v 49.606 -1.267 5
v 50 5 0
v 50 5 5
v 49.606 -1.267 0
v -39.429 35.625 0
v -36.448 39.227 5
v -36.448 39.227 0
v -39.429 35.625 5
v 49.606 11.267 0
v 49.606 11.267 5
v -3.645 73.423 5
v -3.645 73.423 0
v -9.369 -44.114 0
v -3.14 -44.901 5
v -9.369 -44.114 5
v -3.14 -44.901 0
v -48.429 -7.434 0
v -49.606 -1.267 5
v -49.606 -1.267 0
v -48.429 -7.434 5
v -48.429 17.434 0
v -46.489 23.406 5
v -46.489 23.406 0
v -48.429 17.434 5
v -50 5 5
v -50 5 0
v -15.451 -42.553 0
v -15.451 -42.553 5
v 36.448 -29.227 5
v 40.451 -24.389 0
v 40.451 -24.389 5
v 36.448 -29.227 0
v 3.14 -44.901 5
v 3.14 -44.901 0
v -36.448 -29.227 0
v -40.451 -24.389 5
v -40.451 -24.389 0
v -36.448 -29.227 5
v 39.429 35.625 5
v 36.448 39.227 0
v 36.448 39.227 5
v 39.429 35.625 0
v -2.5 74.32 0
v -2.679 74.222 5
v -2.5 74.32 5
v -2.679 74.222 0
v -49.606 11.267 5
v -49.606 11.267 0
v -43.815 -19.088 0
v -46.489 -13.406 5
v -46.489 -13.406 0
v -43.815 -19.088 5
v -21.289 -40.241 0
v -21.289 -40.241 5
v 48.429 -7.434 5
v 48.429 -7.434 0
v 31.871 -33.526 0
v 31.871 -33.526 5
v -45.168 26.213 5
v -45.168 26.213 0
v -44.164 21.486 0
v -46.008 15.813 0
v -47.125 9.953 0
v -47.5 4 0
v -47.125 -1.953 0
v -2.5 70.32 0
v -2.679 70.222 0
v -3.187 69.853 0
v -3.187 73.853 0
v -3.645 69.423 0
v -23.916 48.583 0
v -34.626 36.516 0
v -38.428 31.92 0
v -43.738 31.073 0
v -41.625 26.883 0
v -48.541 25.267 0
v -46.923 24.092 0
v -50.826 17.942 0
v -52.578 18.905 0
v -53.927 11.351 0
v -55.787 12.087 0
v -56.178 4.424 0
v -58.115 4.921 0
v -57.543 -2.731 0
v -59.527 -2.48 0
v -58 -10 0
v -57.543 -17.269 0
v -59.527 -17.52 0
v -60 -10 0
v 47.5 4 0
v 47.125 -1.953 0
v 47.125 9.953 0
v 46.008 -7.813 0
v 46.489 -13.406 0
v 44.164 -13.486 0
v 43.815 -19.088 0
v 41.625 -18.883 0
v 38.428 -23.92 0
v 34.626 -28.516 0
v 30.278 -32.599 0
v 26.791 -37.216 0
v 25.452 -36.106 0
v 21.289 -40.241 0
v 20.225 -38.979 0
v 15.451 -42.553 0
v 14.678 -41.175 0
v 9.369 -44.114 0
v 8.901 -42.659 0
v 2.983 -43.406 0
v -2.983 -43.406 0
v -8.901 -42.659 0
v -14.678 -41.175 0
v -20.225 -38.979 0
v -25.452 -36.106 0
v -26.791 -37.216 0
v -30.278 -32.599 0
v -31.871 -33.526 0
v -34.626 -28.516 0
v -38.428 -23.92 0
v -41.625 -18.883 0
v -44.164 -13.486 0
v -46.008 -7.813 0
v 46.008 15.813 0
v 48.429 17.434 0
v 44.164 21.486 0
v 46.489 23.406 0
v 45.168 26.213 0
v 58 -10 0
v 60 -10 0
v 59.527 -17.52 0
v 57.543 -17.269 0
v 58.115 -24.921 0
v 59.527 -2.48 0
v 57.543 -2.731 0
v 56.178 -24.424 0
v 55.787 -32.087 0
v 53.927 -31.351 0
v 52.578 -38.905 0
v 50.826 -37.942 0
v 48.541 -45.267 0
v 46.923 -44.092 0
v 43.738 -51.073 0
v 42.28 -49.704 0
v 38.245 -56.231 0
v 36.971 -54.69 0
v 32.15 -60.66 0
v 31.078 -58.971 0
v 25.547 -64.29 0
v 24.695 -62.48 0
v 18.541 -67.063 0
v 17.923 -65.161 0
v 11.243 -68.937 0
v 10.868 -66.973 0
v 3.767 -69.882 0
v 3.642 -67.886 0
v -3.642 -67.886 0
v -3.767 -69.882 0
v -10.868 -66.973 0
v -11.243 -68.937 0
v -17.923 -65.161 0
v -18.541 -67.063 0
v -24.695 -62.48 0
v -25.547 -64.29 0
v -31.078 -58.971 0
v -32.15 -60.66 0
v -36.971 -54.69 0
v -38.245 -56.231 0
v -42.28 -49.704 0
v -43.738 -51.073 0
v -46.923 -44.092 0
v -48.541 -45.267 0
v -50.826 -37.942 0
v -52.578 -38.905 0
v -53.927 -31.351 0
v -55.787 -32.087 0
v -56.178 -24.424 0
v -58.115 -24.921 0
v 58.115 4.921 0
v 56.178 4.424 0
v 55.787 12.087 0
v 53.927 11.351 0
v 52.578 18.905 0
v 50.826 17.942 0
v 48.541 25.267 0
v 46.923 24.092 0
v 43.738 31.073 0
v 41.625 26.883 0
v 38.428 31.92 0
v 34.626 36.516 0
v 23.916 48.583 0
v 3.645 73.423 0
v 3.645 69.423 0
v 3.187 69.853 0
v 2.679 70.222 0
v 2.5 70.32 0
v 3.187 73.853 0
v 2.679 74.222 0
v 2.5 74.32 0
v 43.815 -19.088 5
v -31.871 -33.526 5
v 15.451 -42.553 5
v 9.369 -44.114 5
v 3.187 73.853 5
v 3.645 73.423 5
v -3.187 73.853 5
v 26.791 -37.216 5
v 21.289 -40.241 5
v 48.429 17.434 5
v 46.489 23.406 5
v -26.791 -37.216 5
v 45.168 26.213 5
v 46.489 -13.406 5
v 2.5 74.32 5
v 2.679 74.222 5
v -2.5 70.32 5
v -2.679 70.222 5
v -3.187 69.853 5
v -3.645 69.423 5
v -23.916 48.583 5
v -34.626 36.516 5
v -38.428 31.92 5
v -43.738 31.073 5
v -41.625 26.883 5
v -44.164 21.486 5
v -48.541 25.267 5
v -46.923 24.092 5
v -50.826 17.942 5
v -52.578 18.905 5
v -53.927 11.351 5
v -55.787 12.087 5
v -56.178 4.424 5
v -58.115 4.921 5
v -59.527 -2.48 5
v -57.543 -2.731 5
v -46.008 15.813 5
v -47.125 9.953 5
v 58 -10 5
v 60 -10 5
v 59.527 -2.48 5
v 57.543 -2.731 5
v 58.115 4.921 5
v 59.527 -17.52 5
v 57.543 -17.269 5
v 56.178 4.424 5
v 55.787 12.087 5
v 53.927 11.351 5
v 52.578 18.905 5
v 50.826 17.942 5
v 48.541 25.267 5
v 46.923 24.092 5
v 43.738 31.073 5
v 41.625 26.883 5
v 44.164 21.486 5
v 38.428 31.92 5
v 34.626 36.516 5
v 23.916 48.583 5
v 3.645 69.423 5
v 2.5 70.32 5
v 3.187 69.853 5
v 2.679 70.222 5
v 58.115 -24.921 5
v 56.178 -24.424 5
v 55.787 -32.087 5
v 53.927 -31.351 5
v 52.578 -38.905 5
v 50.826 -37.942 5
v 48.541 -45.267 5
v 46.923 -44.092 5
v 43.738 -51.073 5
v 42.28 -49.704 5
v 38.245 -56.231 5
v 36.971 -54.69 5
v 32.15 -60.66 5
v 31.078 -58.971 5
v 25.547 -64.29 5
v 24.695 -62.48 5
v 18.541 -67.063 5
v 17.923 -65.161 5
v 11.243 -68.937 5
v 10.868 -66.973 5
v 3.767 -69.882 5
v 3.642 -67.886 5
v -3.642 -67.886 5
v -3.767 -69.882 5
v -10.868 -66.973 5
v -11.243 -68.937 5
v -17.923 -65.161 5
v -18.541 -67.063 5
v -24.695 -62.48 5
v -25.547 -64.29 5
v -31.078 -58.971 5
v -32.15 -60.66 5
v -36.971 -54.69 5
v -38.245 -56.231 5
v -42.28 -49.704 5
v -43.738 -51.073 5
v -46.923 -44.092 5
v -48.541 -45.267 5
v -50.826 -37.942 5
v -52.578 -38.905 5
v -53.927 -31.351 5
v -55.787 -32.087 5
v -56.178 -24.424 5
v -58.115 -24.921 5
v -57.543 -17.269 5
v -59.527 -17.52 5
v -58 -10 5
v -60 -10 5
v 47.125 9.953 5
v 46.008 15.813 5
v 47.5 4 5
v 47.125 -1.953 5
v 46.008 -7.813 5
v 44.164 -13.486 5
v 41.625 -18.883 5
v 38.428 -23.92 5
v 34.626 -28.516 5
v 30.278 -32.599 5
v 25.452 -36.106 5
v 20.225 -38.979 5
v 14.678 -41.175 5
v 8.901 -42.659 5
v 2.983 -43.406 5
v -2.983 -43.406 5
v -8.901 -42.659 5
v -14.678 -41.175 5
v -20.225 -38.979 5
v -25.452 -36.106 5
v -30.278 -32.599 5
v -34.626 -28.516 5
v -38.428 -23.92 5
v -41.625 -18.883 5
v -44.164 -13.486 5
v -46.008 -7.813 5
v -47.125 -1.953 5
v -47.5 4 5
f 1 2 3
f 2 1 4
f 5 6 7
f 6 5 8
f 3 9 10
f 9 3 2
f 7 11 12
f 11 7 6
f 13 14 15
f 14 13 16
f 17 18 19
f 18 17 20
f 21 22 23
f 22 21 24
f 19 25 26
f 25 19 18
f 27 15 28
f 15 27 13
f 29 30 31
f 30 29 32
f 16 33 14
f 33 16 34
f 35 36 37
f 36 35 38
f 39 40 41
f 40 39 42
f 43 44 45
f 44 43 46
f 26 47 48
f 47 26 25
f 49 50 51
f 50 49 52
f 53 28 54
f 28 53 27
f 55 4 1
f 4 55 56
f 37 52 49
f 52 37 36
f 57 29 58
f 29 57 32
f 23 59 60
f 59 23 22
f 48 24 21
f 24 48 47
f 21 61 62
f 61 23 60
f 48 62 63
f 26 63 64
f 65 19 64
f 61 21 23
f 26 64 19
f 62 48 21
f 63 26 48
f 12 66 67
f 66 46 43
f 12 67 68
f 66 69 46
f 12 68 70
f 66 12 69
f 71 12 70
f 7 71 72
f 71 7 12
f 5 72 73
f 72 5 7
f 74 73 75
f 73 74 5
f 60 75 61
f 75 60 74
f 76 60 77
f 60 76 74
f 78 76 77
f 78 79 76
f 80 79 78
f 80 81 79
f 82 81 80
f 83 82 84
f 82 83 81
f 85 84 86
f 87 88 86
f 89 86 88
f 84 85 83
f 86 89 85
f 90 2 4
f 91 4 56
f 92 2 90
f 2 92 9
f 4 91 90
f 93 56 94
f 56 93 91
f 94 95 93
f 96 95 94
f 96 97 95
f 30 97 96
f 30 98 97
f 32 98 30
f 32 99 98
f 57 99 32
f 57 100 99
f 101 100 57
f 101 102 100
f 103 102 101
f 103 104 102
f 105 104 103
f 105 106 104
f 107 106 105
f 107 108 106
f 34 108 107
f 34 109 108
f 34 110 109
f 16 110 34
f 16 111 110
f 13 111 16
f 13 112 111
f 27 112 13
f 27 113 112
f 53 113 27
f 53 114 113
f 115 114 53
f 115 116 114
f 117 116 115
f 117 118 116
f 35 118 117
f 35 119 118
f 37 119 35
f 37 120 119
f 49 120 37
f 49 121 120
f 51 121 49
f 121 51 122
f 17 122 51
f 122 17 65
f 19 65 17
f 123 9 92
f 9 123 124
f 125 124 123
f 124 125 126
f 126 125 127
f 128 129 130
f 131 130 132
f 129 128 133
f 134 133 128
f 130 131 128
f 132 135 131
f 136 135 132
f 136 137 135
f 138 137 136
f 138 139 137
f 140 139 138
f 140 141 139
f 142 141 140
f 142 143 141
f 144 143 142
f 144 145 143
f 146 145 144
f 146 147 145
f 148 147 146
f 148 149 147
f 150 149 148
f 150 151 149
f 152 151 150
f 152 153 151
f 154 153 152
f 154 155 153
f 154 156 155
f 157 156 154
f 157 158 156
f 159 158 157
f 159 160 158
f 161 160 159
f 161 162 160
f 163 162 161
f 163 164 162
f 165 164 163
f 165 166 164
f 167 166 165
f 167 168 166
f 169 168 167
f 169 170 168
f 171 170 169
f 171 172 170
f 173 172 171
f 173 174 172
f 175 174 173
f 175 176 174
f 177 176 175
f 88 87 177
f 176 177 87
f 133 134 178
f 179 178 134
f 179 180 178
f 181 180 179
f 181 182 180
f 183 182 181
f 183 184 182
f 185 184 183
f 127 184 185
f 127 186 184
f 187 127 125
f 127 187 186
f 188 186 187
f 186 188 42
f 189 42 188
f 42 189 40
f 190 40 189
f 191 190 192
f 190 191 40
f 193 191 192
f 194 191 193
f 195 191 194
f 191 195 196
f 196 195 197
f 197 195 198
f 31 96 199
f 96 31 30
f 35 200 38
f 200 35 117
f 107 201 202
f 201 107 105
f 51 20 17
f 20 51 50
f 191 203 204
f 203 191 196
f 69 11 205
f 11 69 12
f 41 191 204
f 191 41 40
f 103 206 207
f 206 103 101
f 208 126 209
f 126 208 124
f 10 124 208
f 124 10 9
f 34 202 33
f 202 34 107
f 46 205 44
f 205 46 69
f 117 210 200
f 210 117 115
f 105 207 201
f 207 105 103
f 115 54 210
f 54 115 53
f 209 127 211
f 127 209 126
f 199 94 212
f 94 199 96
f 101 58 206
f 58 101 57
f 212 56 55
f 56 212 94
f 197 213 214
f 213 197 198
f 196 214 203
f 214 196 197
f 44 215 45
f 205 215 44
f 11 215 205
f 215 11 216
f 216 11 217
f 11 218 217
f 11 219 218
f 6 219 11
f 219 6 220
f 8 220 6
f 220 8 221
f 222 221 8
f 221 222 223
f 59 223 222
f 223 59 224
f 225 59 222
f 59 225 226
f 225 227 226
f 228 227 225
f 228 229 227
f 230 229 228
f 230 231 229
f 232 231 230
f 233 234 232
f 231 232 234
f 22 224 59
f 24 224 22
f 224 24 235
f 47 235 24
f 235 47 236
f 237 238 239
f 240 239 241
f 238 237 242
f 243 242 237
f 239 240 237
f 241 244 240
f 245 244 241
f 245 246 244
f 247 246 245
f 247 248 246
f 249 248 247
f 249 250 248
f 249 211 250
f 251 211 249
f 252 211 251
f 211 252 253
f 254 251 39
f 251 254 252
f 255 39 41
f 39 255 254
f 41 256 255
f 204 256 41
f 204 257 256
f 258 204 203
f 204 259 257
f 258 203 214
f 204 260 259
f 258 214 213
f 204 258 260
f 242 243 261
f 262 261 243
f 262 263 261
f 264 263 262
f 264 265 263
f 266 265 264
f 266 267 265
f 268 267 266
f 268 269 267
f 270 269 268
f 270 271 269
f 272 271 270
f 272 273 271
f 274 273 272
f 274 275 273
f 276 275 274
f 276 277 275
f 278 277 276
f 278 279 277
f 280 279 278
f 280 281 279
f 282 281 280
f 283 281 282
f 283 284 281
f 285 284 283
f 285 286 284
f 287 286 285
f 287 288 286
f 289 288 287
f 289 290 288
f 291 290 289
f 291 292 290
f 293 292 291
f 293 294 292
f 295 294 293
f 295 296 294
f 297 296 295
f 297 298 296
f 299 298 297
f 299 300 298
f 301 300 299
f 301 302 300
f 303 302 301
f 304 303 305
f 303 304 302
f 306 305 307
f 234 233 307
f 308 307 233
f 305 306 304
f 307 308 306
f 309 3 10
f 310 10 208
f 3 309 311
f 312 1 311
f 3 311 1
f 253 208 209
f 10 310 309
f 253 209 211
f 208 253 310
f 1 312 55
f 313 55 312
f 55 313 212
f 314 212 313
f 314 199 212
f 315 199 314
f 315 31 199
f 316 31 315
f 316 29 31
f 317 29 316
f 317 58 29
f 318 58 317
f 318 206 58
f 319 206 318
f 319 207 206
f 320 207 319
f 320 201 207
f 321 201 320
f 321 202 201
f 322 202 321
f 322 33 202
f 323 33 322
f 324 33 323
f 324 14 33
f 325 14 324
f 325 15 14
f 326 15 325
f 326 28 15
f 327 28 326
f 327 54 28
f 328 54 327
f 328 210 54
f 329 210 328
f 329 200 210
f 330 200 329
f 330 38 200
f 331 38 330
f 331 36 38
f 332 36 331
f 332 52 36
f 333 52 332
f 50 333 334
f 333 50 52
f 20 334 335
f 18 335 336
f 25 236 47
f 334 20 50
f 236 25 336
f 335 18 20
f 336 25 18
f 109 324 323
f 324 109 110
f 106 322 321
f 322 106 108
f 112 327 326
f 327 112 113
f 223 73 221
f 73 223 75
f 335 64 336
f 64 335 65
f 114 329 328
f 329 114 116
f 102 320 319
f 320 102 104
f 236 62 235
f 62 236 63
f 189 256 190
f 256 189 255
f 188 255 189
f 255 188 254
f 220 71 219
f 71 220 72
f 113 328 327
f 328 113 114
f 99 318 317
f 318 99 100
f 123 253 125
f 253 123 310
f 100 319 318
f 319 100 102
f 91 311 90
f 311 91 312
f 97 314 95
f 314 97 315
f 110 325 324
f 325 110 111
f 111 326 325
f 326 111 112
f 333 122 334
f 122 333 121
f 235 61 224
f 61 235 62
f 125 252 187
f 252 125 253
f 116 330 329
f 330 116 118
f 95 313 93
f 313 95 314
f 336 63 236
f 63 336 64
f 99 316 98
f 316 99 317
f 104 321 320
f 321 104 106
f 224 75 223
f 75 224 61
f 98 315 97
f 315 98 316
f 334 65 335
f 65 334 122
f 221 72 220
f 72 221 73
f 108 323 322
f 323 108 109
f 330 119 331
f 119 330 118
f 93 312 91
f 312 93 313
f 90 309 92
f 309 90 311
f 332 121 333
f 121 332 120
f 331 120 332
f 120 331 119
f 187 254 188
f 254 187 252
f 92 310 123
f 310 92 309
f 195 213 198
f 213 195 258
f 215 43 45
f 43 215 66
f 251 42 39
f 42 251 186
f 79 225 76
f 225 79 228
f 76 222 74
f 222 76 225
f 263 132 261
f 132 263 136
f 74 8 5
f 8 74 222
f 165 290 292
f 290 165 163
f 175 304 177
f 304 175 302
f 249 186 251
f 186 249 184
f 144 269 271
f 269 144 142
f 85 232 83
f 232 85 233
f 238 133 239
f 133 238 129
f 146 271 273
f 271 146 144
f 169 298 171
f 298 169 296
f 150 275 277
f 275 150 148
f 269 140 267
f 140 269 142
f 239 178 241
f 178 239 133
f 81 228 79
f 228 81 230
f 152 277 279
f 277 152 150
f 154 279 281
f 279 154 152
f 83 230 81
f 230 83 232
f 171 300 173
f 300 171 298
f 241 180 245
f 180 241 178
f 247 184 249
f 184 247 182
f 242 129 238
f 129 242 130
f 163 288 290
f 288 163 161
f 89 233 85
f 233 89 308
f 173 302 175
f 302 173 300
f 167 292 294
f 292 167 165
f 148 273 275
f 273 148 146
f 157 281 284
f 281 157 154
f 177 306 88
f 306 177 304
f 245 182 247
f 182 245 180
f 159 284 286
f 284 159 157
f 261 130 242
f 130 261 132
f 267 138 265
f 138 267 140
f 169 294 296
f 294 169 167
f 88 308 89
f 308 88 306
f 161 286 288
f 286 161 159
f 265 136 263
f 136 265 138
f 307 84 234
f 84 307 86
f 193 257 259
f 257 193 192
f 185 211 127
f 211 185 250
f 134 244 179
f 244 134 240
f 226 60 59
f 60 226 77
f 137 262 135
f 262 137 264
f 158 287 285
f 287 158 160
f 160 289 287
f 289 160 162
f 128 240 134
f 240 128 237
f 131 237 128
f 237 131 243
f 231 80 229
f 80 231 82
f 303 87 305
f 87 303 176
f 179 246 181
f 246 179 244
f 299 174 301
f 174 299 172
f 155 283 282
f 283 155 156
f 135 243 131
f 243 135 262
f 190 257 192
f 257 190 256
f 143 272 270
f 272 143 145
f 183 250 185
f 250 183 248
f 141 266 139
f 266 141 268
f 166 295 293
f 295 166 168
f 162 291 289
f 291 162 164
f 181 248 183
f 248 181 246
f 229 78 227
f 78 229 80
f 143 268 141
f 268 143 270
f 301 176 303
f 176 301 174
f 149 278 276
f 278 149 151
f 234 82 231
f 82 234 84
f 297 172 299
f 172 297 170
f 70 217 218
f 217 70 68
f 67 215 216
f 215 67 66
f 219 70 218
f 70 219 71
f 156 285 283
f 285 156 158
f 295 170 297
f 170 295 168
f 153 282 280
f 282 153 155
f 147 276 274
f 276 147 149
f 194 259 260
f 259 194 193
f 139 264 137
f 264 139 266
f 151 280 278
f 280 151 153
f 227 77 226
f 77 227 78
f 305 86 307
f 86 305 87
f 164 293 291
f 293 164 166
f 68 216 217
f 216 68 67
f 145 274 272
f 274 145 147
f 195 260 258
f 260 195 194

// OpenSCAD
$fn=50;

union() {
    difference() {
        hull() {
            translate([0,5,0]) cylinder(d=100,h=5);
            translate([0,70,0]) cylinder(d=10,h=5);
        }
        hull() {
            translate([0,4,-0.05]) cylinder(d=95,h=5.1);
            translate([0,68,-0.05]) cylinder(d=10,h=5.1);
        }
        translate([0,70,0]) cube([5,20,20], center=true);
    }

    difference() {
        hull() {
            translate([0,-10,0]) cylinder(d=120,h=5);
            translate([0,70,0]) cylinder(d=10,h=5);
        }
        hull() {
            translate([0,-10,-0.05]) cylinder(d=116,h=5.1);
            translate([0,66,-0.05]) cylinder(d=10,h=5.1);
        }
        translate([0,70,0]) cube([5,20,20], center=true);
    }
}
